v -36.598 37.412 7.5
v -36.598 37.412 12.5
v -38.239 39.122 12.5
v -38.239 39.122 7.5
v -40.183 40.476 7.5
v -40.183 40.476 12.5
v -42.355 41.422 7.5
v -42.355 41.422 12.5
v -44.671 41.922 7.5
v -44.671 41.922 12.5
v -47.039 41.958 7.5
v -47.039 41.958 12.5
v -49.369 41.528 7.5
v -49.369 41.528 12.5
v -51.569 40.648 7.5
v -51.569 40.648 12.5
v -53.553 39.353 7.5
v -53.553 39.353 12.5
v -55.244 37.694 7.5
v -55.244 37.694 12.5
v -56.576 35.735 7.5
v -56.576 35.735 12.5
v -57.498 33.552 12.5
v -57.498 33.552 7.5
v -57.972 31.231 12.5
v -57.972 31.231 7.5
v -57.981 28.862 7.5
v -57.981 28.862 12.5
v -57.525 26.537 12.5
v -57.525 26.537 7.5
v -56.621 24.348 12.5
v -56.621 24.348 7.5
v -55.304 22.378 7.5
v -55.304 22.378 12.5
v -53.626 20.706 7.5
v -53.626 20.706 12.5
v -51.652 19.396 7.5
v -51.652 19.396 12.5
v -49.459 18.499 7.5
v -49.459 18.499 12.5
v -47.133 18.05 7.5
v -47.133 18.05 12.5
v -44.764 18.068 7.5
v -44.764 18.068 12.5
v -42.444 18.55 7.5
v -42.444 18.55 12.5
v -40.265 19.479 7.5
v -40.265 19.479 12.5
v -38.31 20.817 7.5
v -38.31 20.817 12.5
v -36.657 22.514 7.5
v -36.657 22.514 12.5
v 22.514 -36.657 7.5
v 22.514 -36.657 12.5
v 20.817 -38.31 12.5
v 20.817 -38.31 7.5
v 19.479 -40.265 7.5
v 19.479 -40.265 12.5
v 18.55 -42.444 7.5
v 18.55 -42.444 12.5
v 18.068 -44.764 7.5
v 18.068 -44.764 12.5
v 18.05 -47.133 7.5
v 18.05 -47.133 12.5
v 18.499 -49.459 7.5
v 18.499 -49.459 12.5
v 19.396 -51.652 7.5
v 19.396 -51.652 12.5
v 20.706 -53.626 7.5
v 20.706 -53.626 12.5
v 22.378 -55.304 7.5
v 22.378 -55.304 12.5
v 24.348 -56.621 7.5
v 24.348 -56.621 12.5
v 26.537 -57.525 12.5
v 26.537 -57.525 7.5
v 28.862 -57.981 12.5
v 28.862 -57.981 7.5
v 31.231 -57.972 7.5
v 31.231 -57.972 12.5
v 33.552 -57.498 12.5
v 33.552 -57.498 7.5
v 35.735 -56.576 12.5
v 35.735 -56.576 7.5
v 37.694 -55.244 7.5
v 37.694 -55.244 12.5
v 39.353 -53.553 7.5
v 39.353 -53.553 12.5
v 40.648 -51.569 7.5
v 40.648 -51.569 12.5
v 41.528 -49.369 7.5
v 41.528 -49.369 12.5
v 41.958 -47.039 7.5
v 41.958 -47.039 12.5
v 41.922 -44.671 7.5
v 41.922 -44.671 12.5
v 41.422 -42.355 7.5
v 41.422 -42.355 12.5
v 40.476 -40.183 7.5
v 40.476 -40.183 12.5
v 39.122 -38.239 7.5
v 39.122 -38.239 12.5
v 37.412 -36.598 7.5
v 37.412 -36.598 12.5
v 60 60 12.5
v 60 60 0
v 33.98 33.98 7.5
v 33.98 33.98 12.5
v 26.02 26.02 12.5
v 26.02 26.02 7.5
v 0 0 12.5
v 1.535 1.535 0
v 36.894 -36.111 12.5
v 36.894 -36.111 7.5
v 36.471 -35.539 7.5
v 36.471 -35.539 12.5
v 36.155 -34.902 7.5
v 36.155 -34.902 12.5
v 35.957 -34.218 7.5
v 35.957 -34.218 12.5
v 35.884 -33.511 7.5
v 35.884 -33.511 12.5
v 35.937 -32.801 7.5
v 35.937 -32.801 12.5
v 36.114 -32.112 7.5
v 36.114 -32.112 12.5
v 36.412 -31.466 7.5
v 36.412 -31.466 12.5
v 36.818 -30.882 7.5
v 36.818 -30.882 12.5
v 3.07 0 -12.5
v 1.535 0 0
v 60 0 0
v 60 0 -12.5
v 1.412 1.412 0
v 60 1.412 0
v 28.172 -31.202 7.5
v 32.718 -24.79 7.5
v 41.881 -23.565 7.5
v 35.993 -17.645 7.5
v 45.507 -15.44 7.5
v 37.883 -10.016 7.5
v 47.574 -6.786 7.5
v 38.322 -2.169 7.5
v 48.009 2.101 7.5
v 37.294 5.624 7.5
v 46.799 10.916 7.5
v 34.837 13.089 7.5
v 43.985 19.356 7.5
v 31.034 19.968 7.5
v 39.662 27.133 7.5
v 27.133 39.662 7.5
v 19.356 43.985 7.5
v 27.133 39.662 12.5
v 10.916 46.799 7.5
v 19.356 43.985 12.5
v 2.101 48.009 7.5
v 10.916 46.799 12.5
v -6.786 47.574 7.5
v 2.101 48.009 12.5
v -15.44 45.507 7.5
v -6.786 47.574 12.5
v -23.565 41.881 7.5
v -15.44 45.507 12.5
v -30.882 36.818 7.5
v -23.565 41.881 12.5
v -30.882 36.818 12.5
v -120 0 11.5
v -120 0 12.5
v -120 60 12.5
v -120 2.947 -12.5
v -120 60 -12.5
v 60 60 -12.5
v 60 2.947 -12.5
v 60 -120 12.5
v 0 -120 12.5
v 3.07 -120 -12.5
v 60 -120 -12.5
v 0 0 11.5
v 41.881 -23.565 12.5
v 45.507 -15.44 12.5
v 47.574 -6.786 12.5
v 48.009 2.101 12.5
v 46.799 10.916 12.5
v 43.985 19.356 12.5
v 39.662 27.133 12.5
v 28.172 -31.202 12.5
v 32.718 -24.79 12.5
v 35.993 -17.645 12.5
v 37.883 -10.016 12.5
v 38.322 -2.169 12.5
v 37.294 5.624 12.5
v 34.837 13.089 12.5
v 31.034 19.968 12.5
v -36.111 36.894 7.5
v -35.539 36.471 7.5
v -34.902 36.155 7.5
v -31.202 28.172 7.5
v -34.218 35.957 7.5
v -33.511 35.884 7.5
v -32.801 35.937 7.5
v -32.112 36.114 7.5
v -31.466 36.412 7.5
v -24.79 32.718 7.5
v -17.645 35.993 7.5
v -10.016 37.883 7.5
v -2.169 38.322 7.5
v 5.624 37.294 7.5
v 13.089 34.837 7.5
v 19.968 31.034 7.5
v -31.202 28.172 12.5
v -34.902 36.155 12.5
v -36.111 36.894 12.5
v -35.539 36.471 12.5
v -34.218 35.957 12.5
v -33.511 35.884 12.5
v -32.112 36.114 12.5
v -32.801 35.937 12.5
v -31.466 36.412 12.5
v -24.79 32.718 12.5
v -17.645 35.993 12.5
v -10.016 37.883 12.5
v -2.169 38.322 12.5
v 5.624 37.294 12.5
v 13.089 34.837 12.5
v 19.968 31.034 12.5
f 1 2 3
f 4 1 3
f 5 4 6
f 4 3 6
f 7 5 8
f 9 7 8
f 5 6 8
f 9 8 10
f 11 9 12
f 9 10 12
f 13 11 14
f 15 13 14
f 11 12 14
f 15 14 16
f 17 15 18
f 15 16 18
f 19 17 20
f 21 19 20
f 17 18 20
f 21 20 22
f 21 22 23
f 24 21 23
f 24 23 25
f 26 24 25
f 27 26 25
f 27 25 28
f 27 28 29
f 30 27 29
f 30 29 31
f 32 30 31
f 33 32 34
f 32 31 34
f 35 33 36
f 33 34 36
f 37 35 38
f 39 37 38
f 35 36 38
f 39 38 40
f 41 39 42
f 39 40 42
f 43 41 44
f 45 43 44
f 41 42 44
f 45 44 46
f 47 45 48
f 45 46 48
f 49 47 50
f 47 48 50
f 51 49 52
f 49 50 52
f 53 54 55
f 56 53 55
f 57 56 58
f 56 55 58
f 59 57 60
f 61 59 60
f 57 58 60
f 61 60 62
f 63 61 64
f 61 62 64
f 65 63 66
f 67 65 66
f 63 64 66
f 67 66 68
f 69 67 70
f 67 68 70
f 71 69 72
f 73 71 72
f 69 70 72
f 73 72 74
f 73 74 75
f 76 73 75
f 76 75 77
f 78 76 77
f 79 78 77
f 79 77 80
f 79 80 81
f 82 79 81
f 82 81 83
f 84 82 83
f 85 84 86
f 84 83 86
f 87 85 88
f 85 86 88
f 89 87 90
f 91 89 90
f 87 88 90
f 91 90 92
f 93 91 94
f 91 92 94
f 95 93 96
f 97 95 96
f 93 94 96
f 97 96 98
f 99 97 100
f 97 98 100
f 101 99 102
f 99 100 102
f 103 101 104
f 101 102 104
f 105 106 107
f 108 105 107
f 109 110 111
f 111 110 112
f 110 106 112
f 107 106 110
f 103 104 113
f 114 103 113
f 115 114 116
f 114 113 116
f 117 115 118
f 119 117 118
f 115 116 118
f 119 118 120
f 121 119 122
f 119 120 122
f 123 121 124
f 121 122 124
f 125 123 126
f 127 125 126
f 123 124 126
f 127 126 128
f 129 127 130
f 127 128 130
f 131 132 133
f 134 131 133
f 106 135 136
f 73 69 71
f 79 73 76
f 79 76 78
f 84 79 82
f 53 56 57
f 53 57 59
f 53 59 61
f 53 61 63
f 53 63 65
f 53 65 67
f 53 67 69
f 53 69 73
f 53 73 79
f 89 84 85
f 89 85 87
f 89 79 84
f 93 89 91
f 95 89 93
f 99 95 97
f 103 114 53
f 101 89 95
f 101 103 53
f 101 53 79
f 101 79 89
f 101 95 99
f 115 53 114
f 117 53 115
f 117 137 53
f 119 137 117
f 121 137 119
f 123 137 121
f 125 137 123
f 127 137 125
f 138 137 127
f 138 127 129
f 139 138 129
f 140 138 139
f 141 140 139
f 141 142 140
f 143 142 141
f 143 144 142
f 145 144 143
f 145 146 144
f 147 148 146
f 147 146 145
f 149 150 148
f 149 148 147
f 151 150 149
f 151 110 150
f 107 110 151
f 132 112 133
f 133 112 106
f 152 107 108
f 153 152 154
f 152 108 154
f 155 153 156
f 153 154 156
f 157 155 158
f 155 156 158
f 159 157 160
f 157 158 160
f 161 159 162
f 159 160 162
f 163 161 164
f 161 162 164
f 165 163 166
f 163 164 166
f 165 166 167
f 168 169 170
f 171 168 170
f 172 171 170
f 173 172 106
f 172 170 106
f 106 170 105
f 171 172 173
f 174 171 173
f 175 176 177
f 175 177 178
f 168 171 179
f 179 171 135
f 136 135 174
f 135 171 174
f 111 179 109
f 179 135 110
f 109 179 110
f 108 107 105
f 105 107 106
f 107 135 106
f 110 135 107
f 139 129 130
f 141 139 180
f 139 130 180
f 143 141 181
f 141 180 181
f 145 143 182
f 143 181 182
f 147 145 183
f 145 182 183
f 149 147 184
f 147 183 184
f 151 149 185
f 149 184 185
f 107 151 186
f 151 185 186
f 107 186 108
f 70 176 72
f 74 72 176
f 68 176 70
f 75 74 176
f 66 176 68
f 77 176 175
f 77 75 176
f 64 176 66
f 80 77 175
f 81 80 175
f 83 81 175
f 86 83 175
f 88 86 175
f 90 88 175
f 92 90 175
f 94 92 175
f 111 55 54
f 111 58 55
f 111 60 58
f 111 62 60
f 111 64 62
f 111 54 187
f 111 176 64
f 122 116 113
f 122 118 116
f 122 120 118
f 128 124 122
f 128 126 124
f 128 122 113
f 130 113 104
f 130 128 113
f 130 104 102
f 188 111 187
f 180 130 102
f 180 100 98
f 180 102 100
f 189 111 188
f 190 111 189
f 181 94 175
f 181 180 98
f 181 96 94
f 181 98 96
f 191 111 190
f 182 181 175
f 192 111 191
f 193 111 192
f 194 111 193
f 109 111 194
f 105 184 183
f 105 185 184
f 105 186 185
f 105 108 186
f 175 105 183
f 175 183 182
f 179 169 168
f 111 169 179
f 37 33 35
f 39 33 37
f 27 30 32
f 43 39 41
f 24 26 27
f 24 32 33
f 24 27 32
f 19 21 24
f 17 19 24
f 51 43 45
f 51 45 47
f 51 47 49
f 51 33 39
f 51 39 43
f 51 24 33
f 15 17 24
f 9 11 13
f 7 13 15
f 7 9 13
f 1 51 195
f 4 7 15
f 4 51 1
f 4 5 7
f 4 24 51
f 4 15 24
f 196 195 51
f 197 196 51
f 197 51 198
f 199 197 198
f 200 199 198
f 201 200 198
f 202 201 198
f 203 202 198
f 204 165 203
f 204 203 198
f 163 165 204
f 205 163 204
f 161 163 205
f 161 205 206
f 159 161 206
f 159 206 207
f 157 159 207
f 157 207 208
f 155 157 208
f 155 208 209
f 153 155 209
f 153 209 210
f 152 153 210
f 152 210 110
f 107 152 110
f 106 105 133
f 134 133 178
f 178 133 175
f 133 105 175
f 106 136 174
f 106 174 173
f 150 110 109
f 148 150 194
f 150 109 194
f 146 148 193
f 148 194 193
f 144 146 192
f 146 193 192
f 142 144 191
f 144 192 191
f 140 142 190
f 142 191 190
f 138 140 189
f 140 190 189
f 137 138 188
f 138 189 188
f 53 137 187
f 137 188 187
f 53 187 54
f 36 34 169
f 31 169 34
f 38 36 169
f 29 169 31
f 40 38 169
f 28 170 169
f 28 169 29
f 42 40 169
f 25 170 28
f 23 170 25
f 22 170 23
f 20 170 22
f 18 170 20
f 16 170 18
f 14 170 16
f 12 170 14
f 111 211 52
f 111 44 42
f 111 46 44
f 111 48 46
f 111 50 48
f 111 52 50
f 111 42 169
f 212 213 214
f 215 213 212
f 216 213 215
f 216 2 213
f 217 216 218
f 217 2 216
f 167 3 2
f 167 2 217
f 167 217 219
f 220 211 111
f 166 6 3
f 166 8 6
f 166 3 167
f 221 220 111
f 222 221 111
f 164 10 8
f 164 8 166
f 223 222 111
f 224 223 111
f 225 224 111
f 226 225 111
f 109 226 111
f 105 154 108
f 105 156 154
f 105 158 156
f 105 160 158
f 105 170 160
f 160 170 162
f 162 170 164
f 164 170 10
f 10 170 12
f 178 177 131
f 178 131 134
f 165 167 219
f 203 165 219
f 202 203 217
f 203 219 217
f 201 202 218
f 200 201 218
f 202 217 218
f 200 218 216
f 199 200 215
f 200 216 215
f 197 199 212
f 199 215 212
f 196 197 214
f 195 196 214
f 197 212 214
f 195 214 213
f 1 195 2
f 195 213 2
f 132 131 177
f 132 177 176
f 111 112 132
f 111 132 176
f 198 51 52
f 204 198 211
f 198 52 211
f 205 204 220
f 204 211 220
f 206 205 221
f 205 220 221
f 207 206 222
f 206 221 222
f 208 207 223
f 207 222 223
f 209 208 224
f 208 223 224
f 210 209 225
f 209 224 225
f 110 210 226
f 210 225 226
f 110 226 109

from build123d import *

# Parameters (mm, degrees)
F2_DEPTH     = 12.5
F3_W         = 180
F3_H         = 60
F4_DEPTH     = 12.5
F5_SIZE2     = 2.9468294617
F5_SIZE      = 24
F7_DEPTH     = 12.5
F8_W         = 60
F8_H         = 120
F9_DEPTH     = 12.5
F10_T1_DEPTH = 249.96415925
F13_DEPTH    = 5


# Not quite as in the source:
# - a fillet or chamfer that OpenCascade refuses, or shapes differently, is made with other operations: its cross-section is extruded or revolved along the edge and cut away or added


with BuildPart() as f2:
    # F1 (on Top) → F2 (new body)
    with BuildSketch(Plane.XY):
        Polygon((-120, 0), (0, 0), (12.6794919243, 12.6794919243), (47.3205080757, 47.3205080757), (60, 60), (-120, 60), align=None)
    extrude(amount=F2_DEPTH)

    # F3 (on Top) → F4 (join)
    with BuildSketch(Plane.XY):
        with Locations((-30, 30)):
            Rectangle(F3_W, F3_H)
    extrude(amount=-F4_DEPTH)

    # F5
    f5_edges = [f2.edges().sort_by_distance(p)[0] for p in [
        (-30, 0, -12.5),
    ]]
    f5_side = f2.faces().sort_by_distance((-42, 0, -1.25))[0]
    chamfer(f5_edges, length=F5_SIZE, length2=F5_SIZE2, reference=f5_side)


with BuildPart() as f7:
    # F6 (on Top) → F7 (new body)
    with BuildSketch(Plane.XY):
        Polygon((60, -120), (60, 60), (47.3205080757, 47.3205080757), (12.6794919243, 12.6794919243), (0, 0), (0, -120), align=None)
    extrude(amount=F7_DEPTH)

    # F8 (on face) → F9 (join)
    with BuildSketch(Plane(origin=(0, 0, 0), x_dir=(1, 0, 0), z_dir=(0, 0, -1))):
        with Locations((30, 60)):
            Rectangle(F8_W, F8_H)
    extrude(amount=F9_DEPTH)

    # F10: chamfer of 25 x 3.0696140226 on 1 edges, made by hand

    # F10_s2 → F10_t1 (cut)
    with BuildSketch(Plane.XZ.offset(-64.982079625)):
        Polygon((3.0696140226, -12.5), (0, 12.5), (0, -12.5), align=None)
    extrude(amount=F10_T1_DEPTH, mode=Mode.SUBTRACT)


with BuildPart() as f13_tool:
    # F12 (on plane+point) → F13 (new body)
    with BuildSketch(Plane.XY.offset(12.5)):
        with BuildLine():
            ThreePointArc((37.4123746331, -36.5984442616), (35.9045811532, -33.8661359121), (36.8184902357, -30.8822256783))
            ThreePointArc((36.8184902357, -30.8822256783), (33.9802375365, 33.9802375365), (-30.8822256783, 36.8184902357))
            ThreePointArc((-30.8822256783, 36.8184902357), (-33.8661359121, 35.9045811532), (-36.5984442616, 37.4123746331))
            ThreePointArc((-36.5984442616, 37.4123746331), (-58.0353381129, 30.0469938735), (-36.6567893055, 22.5139398702))
            ThreePointArc((-36.6567893055, 22.5139398702), (26.0197624635, 26.0197624635), (22.5139398702, -36.6567893055))
            ThreePointArc((22.5139398702, -36.6567893055), (30.0469938735, -58.0353381129), (37.4123746331, -36.5984442616))
        make_face()
    extrude(amount=-F13_DEPTH)


with BuildPart() as f2_1:
    add(f2.part)

    # F13: cut by f13_tool
    add(f13_tool.part, mode=Mode.SUBTRACT)


with BuildPart() as f7_1:
    add(f7.part)

    # F13: cut by f13_tool
    add(f13_tool.part, mode=Mode.SUBTRACT)


solid = Compound([f2_1.part, f7_1.part])
